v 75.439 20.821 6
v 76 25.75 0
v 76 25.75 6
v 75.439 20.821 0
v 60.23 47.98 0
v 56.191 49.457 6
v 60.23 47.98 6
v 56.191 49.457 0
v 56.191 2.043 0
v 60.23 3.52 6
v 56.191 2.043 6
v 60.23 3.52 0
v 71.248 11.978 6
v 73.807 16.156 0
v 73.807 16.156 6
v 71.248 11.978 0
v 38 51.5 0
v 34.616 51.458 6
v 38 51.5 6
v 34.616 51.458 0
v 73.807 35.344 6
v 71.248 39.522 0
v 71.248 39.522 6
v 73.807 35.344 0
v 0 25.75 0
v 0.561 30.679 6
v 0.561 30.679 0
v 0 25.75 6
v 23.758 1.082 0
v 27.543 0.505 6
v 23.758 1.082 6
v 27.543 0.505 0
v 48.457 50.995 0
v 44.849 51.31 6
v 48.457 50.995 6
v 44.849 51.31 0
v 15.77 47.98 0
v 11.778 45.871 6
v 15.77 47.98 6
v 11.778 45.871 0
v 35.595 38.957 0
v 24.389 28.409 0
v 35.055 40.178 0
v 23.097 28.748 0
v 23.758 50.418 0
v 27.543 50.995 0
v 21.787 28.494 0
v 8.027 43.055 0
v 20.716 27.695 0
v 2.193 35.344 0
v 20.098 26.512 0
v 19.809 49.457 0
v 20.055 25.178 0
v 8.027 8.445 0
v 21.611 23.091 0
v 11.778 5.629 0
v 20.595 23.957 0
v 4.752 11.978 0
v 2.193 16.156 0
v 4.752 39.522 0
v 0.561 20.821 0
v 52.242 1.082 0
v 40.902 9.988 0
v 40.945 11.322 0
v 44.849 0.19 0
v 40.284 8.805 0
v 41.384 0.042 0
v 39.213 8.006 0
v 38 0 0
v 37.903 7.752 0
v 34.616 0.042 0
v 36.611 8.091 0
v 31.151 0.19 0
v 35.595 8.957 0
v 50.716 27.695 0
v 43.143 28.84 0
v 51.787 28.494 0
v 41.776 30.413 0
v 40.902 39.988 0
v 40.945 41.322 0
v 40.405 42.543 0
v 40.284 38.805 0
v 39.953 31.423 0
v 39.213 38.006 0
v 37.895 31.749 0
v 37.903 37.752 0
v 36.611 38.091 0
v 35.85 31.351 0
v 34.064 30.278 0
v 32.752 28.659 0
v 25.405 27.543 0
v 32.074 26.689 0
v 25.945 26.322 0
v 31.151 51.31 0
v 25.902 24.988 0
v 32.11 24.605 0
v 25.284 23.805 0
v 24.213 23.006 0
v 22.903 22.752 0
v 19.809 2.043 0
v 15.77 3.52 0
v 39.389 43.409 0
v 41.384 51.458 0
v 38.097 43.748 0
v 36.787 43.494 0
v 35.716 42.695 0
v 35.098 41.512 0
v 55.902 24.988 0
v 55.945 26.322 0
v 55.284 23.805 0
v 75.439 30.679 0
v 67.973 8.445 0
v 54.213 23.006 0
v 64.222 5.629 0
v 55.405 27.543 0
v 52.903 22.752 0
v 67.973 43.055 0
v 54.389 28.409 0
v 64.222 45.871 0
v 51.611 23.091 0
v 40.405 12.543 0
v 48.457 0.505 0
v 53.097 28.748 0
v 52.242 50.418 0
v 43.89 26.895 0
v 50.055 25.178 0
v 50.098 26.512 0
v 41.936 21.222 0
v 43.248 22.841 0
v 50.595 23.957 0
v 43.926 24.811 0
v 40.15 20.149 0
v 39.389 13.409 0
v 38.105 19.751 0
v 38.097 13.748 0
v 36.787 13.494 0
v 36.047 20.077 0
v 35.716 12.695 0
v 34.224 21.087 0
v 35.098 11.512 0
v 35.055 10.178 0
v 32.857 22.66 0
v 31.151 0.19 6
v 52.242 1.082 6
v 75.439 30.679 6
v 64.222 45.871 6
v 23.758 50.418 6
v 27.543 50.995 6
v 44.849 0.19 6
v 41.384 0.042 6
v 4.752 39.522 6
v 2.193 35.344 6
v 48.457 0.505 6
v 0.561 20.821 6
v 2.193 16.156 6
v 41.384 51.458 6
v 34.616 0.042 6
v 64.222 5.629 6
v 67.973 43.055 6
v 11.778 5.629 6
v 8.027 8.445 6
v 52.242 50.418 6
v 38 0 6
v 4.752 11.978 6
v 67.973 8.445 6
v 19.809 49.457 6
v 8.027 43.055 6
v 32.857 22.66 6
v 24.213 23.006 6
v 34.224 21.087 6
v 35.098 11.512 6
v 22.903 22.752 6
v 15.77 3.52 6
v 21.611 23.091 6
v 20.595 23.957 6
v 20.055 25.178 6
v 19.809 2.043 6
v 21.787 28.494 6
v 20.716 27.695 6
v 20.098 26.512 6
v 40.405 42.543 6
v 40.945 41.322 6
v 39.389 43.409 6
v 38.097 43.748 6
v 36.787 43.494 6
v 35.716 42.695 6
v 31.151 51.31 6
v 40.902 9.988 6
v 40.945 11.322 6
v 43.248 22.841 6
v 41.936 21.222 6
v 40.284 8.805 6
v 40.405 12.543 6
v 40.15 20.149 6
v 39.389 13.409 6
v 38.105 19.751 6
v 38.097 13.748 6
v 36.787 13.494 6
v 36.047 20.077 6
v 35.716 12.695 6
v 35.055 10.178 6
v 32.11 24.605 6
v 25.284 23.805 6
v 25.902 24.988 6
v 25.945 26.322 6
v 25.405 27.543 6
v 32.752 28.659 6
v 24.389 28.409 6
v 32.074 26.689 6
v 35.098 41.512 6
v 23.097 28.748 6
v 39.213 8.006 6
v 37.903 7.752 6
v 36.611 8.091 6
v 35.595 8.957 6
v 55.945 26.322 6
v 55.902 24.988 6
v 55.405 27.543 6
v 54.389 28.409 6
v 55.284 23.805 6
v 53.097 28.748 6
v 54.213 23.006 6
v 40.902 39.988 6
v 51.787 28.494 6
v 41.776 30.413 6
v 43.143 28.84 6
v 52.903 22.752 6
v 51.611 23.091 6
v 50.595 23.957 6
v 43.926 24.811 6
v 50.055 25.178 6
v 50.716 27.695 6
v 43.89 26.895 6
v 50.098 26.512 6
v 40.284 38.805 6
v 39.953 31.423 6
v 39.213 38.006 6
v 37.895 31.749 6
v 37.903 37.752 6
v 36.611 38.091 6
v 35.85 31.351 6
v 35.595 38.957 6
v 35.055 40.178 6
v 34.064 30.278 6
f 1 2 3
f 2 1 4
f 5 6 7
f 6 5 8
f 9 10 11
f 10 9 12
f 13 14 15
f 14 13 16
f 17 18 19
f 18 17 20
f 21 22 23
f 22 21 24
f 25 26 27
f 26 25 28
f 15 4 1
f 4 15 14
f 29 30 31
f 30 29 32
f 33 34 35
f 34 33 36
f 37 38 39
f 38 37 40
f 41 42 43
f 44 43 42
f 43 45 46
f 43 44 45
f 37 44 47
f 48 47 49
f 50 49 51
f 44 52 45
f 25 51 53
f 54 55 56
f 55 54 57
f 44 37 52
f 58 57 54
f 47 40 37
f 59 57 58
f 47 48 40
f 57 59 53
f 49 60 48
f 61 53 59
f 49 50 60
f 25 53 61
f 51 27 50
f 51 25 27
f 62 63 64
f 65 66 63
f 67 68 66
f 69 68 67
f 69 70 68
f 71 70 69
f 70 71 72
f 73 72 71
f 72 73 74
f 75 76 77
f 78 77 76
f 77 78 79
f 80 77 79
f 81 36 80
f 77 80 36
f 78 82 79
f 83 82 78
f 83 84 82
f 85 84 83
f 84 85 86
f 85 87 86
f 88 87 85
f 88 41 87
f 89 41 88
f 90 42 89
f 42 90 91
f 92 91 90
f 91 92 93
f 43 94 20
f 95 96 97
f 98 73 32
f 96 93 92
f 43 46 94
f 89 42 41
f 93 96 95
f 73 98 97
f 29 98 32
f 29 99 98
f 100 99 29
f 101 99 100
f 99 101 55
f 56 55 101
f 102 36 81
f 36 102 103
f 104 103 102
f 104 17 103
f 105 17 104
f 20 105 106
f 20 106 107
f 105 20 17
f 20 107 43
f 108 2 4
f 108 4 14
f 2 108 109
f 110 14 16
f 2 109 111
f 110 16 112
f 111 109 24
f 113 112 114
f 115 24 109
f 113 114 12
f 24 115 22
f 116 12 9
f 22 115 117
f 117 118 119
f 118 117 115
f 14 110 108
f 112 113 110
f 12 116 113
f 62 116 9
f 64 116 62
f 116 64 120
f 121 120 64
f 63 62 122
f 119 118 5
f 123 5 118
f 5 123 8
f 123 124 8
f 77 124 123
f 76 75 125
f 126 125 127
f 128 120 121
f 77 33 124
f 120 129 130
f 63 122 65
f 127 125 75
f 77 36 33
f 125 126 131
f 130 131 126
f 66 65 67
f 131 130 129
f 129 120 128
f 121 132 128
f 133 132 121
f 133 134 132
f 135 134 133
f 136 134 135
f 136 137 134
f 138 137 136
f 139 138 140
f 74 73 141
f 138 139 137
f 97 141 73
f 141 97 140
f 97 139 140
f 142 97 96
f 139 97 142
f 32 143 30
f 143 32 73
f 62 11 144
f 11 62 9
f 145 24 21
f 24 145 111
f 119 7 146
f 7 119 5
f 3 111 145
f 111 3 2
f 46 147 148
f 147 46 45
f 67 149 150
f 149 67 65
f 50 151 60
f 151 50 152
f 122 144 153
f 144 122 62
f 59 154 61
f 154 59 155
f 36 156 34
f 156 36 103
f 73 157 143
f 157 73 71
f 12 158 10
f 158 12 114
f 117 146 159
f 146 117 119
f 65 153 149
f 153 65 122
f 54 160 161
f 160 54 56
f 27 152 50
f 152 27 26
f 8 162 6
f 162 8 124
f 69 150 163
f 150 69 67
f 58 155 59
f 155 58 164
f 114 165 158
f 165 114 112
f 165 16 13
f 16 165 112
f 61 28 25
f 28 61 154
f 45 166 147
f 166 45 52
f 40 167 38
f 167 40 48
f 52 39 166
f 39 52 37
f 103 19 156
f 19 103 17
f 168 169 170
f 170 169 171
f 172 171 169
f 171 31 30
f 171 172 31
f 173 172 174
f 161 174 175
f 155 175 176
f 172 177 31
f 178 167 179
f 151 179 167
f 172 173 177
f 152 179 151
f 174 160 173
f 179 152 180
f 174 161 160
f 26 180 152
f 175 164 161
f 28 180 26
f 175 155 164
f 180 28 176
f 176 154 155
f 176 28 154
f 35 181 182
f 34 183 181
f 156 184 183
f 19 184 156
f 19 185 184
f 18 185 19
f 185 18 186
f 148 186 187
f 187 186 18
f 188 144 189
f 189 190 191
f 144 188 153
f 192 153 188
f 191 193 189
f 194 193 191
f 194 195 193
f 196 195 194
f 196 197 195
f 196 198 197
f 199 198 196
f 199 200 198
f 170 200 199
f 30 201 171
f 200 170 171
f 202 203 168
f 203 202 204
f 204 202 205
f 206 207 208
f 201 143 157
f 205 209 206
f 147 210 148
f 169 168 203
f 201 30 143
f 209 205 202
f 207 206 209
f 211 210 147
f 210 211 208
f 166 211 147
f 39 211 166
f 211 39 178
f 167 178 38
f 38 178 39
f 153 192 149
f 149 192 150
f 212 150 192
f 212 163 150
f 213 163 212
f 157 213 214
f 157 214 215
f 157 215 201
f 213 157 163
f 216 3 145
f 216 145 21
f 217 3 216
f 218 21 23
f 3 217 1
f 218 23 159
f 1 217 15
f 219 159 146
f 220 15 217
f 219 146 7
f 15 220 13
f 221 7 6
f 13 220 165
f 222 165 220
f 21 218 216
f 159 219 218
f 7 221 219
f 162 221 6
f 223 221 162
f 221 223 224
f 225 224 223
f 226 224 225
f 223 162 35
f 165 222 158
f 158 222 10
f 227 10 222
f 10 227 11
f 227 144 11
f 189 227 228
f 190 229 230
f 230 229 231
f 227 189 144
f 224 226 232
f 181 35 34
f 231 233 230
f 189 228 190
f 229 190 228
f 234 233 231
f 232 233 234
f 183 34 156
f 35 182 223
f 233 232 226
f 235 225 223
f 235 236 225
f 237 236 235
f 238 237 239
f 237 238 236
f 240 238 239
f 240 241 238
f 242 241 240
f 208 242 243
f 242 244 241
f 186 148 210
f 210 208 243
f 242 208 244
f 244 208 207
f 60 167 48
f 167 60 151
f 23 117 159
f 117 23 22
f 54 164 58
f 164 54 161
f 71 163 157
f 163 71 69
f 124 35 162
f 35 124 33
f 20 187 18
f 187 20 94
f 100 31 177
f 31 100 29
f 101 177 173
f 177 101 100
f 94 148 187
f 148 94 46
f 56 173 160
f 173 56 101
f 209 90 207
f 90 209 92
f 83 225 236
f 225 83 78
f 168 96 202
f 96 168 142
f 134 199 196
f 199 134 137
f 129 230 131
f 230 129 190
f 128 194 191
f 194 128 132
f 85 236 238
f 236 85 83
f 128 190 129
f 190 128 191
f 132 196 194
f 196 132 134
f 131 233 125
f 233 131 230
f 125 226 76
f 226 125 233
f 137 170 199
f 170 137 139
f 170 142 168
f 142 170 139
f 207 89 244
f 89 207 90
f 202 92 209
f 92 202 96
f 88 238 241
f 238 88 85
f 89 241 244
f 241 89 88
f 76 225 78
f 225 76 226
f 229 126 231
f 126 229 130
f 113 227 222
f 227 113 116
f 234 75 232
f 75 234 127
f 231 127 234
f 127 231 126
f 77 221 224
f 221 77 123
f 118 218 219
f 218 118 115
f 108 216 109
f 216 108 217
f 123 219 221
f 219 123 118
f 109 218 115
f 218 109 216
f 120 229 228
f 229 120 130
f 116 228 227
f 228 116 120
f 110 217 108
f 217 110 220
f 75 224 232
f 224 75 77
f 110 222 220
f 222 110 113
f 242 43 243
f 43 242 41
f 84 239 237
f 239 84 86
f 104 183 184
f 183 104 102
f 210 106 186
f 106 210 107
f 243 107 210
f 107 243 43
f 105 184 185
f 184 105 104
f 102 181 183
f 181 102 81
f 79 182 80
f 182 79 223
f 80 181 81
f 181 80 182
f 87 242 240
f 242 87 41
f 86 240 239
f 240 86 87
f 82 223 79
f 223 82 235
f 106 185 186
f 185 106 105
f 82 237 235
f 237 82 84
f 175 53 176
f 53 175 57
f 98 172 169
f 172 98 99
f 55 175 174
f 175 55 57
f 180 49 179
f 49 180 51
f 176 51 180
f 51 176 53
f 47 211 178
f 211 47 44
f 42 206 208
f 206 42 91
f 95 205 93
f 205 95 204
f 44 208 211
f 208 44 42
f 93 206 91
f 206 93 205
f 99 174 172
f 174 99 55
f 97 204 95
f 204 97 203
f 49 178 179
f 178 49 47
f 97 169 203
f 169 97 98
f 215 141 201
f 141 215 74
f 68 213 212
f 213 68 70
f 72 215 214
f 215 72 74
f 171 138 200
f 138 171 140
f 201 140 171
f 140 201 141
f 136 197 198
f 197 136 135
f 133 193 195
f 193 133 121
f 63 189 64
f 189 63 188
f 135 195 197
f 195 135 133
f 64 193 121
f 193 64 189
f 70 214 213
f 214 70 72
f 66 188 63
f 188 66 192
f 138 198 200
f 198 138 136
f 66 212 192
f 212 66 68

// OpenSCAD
$fn = 32;

// ----------------------------------------------------------------------
// Cam plate: double_lobe cam, base R24
// ----------------------------------------------------------------------

// --- parameters (mm) ---
base_r = 24;              // base circle radius
lobe_h = 14;              // cam lobe rise
bore_r = 6;               // shaft bore radius
plate_t = 6;              // plate thickness, Z (extrusion height)
ring_r = 15;              // lightening ring radius
bolt_r = 3;               // lightening hole radius

profile = [[76, 25.75], [75.439, 30.679], [73.807, 35.344], [71.248, 39.522], [67.973, 43.055], [64.222, 45.871], [60.23, 47.98], [56.191, 49.457], [52.242, 50.418], [48.457, 50.995], [44.849, 51.31], [41.384, 51.458], [38, 51.5], [34.616, 51.458], [31.151, 51.31], [27.543, 50.995], [23.758, 50.418], [19.809, 49.457], [15.77, 47.98], [11.778, 45.871], [8.027, 43.055], [4.752, 39.522], [2.193, 35.344], [0.561, 30.679], [0, 25.75], [0.561, 20.821], [2.193, 16.156], [4.752, 11.978], [8.027, 8.445], [11.778, 5.629], [15.77, 3.52], [19.809, 2.043], [23.758, 1.082], [27.543, 0.505], [31.151, 0.19], [34.616, 0.042], [38, 0], [41.384, 0.042], [44.849, 0.19], [48.457, 0.505], [52.242, 1.082], [56.191, 2.043], [60.23, 3.52], [64.222, 5.629], [67.973, 8.445], [71.248, 11.978], [73.807, 16.156], [75.439, 20.821]];  // primary outline, 48 points, counter clockwise
void_1 = [[43.89, 26.895], [43.143, 28.84], [41.776, 30.413], [39.953, 31.423], [37.895, 31.749], [35.85, 31.351], [34.064, 30.278], [32.752, 28.659], [32.074, 26.689], [32.11, 24.605], [32.857, 22.66], [34.224, 21.087], [36.047, 20.077], [38.105, 19.751], [40.15, 20.149], [41.936, 21.222], [43.248, 22.841], [43.926, 24.811]];  // shaft bore, 18 points
void_2 = [[55.945, 26.322], [55.405, 27.543], [54.389, 28.409], [53.097, 28.748], [51.787, 28.494], [50.716, 27.695], [50.098, 26.512], [50.055, 25.178], [50.595, 23.957], [51.611, 23.091], [52.903, 22.752], [54.213, 23.006], [55.284, 23.805], [55.902, 24.988]];  // lightening hole 1, 14 points
void_3 = [[40.945, 41.322], [40.405, 42.543], [39.389, 43.409], [38.097, 43.748], [36.787, 43.494], [35.716, 42.695], [35.098, 41.512], [35.055, 40.178], [35.595, 38.957], [36.611, 38.091], [37.903, 37.752], [39.213, 38.006], [40.284, 38.805], [40.902, 39.988]];  // lightening hole 2, 14 points
void_4 = [[25.945, 26.322], [25.405, 27.543], [24.389, 28.409], [23.097, 28.748], [21.787, 28.494], [20.716, 27.695], [20.098, 26.512], [20.055, 25.178], [20.595, 23.957], [21.611, 23.091], [22.903, 22.752], [24.213, 23.006], [25.284, 23.805], [25.902, 24.988]];  // lightening hole 3, 14 points
void_5 = [[40.945, 11.322], [40.405, 12.543], [39.389, 13.409], [38.097, 13.748], [36.787, 13.494], [35.716, 12.695], [35.098, 11.512], [35.055, 10.178], [35.595, 8.957], [36.611, 8.091], [37.903, 7.752], [39.213, 8.006], [40.284, 8.805], [40.902, 9.988]];  // lightening hole 4, 14 points

// --- the one profile operation ---
difference() {
  linear_extrude(height = plate_t) polygon(points = profile);
  translate([0, 0, -1])
    linear_extrude(height = plate_t + 2) polygon(points = void_1);
  translate([0, 0, -1])
    linear_extrude(height = plate_t + 2) polygon(points = void_2);
  translate([0, 0, -1])
    linear_extrude(height = plate_t + 2) polygon(points = void_3);
  translate([0, 0, -1])
    linear_extrude(height = plate_t + 2) polygon(points = void_4);
  translate([0, 0, -1])
    linear_extrude(height = plate_t + 2) polygon(points = void_5);
}
